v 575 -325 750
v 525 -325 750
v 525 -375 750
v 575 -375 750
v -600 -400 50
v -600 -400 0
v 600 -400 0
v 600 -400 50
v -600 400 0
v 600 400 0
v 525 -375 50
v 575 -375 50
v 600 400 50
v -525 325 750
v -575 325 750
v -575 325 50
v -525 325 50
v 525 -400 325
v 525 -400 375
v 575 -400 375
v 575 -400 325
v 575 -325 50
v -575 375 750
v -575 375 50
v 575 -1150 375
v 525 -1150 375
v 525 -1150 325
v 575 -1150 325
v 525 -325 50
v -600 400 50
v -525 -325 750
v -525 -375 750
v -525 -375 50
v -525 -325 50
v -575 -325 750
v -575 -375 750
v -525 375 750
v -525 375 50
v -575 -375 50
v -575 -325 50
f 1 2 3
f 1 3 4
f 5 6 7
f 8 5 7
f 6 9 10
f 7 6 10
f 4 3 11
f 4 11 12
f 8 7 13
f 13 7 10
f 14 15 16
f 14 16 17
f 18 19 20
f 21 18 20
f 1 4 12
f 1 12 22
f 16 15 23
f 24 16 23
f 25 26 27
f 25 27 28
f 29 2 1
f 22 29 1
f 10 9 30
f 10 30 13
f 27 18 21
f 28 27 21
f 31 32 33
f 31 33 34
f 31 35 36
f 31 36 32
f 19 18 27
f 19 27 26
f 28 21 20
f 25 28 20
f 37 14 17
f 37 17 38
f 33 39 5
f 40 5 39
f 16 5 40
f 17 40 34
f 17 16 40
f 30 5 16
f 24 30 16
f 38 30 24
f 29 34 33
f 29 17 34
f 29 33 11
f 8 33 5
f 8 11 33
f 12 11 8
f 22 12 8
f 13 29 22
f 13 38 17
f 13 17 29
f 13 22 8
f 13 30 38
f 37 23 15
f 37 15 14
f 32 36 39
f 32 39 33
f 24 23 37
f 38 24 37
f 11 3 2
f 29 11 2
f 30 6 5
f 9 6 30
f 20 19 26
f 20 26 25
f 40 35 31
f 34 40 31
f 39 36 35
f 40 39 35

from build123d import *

# Parameters (mm, degrees)
SKETCH_1_W      = 1200
SKETCH_1_H      = 800
EXTRUDE_1_DEPTH = 50
SKETCH_2_W      = 50
SKETCH_2_H      = 50
EXTRUDE_2_DEPTH = 750
SKETCH_3_W      = 50
SKETCH_3_H      = 50
EXTRUDE_3_DEPTH = 750
SKETCH_4_W      = 50
SKETCH_4_H      = 50
EXTRUDE_4_DEPTH = 750
SKETCH_5_W      = 50
SKETCH_5_H      = 50
EXTRUDE_5_DEPTH = 750


with BuildPart() as part:
    # 草图1 → 凸台-拉伸1 (new body)
    with BuildSketch(Plane.XY):
        Rectangle(SKETCH_1_W, SKETCH_1_H)
    extrude(amount=EXTRUDE_1_DEPTH)

    # 草图3 → 凸台-拉伸3 (add)
    with BuildSketch(Plane.XY):
        with Locations((-550, 350)):
            Rectangle(SKETCH_3_W, SKETCH_3_H)
    extrude(amount=EXTRUDE_3_DEPTH)

    # 草图4 → 凸台-拉伸4 (add)
    with BuildSketch(Plane.XY):
        with Locations((550, -350)):
            Rectangle(SKETCH_4_W, SKETCH_4_H)
    extrude(amount=EXTRUDE_4_DEPTH)

    # 草图5 → 凸台-拉伸5 (add)
    with BuildSketch(Plane.XY):
        with Locations((-550, -350)):
            Rectangle(SKETCH_5_W, SKETCH_5_H)
    extrude(amount=EXTRUDE_5_DEPTH)


with BuildPart() as body_2:
    # 草图2 → 凸台-拉伸2 (new body)
    with BuildSketch(Plane.XZ.offset(400)):
        with Locations((550, 350)):
            Rectangle(SKETCH_2_W, SKETCH_2_H)
    extrude(amount=EXTRUDE_2_DEPTH)


solid = Compound([part.part, body_2.part])
